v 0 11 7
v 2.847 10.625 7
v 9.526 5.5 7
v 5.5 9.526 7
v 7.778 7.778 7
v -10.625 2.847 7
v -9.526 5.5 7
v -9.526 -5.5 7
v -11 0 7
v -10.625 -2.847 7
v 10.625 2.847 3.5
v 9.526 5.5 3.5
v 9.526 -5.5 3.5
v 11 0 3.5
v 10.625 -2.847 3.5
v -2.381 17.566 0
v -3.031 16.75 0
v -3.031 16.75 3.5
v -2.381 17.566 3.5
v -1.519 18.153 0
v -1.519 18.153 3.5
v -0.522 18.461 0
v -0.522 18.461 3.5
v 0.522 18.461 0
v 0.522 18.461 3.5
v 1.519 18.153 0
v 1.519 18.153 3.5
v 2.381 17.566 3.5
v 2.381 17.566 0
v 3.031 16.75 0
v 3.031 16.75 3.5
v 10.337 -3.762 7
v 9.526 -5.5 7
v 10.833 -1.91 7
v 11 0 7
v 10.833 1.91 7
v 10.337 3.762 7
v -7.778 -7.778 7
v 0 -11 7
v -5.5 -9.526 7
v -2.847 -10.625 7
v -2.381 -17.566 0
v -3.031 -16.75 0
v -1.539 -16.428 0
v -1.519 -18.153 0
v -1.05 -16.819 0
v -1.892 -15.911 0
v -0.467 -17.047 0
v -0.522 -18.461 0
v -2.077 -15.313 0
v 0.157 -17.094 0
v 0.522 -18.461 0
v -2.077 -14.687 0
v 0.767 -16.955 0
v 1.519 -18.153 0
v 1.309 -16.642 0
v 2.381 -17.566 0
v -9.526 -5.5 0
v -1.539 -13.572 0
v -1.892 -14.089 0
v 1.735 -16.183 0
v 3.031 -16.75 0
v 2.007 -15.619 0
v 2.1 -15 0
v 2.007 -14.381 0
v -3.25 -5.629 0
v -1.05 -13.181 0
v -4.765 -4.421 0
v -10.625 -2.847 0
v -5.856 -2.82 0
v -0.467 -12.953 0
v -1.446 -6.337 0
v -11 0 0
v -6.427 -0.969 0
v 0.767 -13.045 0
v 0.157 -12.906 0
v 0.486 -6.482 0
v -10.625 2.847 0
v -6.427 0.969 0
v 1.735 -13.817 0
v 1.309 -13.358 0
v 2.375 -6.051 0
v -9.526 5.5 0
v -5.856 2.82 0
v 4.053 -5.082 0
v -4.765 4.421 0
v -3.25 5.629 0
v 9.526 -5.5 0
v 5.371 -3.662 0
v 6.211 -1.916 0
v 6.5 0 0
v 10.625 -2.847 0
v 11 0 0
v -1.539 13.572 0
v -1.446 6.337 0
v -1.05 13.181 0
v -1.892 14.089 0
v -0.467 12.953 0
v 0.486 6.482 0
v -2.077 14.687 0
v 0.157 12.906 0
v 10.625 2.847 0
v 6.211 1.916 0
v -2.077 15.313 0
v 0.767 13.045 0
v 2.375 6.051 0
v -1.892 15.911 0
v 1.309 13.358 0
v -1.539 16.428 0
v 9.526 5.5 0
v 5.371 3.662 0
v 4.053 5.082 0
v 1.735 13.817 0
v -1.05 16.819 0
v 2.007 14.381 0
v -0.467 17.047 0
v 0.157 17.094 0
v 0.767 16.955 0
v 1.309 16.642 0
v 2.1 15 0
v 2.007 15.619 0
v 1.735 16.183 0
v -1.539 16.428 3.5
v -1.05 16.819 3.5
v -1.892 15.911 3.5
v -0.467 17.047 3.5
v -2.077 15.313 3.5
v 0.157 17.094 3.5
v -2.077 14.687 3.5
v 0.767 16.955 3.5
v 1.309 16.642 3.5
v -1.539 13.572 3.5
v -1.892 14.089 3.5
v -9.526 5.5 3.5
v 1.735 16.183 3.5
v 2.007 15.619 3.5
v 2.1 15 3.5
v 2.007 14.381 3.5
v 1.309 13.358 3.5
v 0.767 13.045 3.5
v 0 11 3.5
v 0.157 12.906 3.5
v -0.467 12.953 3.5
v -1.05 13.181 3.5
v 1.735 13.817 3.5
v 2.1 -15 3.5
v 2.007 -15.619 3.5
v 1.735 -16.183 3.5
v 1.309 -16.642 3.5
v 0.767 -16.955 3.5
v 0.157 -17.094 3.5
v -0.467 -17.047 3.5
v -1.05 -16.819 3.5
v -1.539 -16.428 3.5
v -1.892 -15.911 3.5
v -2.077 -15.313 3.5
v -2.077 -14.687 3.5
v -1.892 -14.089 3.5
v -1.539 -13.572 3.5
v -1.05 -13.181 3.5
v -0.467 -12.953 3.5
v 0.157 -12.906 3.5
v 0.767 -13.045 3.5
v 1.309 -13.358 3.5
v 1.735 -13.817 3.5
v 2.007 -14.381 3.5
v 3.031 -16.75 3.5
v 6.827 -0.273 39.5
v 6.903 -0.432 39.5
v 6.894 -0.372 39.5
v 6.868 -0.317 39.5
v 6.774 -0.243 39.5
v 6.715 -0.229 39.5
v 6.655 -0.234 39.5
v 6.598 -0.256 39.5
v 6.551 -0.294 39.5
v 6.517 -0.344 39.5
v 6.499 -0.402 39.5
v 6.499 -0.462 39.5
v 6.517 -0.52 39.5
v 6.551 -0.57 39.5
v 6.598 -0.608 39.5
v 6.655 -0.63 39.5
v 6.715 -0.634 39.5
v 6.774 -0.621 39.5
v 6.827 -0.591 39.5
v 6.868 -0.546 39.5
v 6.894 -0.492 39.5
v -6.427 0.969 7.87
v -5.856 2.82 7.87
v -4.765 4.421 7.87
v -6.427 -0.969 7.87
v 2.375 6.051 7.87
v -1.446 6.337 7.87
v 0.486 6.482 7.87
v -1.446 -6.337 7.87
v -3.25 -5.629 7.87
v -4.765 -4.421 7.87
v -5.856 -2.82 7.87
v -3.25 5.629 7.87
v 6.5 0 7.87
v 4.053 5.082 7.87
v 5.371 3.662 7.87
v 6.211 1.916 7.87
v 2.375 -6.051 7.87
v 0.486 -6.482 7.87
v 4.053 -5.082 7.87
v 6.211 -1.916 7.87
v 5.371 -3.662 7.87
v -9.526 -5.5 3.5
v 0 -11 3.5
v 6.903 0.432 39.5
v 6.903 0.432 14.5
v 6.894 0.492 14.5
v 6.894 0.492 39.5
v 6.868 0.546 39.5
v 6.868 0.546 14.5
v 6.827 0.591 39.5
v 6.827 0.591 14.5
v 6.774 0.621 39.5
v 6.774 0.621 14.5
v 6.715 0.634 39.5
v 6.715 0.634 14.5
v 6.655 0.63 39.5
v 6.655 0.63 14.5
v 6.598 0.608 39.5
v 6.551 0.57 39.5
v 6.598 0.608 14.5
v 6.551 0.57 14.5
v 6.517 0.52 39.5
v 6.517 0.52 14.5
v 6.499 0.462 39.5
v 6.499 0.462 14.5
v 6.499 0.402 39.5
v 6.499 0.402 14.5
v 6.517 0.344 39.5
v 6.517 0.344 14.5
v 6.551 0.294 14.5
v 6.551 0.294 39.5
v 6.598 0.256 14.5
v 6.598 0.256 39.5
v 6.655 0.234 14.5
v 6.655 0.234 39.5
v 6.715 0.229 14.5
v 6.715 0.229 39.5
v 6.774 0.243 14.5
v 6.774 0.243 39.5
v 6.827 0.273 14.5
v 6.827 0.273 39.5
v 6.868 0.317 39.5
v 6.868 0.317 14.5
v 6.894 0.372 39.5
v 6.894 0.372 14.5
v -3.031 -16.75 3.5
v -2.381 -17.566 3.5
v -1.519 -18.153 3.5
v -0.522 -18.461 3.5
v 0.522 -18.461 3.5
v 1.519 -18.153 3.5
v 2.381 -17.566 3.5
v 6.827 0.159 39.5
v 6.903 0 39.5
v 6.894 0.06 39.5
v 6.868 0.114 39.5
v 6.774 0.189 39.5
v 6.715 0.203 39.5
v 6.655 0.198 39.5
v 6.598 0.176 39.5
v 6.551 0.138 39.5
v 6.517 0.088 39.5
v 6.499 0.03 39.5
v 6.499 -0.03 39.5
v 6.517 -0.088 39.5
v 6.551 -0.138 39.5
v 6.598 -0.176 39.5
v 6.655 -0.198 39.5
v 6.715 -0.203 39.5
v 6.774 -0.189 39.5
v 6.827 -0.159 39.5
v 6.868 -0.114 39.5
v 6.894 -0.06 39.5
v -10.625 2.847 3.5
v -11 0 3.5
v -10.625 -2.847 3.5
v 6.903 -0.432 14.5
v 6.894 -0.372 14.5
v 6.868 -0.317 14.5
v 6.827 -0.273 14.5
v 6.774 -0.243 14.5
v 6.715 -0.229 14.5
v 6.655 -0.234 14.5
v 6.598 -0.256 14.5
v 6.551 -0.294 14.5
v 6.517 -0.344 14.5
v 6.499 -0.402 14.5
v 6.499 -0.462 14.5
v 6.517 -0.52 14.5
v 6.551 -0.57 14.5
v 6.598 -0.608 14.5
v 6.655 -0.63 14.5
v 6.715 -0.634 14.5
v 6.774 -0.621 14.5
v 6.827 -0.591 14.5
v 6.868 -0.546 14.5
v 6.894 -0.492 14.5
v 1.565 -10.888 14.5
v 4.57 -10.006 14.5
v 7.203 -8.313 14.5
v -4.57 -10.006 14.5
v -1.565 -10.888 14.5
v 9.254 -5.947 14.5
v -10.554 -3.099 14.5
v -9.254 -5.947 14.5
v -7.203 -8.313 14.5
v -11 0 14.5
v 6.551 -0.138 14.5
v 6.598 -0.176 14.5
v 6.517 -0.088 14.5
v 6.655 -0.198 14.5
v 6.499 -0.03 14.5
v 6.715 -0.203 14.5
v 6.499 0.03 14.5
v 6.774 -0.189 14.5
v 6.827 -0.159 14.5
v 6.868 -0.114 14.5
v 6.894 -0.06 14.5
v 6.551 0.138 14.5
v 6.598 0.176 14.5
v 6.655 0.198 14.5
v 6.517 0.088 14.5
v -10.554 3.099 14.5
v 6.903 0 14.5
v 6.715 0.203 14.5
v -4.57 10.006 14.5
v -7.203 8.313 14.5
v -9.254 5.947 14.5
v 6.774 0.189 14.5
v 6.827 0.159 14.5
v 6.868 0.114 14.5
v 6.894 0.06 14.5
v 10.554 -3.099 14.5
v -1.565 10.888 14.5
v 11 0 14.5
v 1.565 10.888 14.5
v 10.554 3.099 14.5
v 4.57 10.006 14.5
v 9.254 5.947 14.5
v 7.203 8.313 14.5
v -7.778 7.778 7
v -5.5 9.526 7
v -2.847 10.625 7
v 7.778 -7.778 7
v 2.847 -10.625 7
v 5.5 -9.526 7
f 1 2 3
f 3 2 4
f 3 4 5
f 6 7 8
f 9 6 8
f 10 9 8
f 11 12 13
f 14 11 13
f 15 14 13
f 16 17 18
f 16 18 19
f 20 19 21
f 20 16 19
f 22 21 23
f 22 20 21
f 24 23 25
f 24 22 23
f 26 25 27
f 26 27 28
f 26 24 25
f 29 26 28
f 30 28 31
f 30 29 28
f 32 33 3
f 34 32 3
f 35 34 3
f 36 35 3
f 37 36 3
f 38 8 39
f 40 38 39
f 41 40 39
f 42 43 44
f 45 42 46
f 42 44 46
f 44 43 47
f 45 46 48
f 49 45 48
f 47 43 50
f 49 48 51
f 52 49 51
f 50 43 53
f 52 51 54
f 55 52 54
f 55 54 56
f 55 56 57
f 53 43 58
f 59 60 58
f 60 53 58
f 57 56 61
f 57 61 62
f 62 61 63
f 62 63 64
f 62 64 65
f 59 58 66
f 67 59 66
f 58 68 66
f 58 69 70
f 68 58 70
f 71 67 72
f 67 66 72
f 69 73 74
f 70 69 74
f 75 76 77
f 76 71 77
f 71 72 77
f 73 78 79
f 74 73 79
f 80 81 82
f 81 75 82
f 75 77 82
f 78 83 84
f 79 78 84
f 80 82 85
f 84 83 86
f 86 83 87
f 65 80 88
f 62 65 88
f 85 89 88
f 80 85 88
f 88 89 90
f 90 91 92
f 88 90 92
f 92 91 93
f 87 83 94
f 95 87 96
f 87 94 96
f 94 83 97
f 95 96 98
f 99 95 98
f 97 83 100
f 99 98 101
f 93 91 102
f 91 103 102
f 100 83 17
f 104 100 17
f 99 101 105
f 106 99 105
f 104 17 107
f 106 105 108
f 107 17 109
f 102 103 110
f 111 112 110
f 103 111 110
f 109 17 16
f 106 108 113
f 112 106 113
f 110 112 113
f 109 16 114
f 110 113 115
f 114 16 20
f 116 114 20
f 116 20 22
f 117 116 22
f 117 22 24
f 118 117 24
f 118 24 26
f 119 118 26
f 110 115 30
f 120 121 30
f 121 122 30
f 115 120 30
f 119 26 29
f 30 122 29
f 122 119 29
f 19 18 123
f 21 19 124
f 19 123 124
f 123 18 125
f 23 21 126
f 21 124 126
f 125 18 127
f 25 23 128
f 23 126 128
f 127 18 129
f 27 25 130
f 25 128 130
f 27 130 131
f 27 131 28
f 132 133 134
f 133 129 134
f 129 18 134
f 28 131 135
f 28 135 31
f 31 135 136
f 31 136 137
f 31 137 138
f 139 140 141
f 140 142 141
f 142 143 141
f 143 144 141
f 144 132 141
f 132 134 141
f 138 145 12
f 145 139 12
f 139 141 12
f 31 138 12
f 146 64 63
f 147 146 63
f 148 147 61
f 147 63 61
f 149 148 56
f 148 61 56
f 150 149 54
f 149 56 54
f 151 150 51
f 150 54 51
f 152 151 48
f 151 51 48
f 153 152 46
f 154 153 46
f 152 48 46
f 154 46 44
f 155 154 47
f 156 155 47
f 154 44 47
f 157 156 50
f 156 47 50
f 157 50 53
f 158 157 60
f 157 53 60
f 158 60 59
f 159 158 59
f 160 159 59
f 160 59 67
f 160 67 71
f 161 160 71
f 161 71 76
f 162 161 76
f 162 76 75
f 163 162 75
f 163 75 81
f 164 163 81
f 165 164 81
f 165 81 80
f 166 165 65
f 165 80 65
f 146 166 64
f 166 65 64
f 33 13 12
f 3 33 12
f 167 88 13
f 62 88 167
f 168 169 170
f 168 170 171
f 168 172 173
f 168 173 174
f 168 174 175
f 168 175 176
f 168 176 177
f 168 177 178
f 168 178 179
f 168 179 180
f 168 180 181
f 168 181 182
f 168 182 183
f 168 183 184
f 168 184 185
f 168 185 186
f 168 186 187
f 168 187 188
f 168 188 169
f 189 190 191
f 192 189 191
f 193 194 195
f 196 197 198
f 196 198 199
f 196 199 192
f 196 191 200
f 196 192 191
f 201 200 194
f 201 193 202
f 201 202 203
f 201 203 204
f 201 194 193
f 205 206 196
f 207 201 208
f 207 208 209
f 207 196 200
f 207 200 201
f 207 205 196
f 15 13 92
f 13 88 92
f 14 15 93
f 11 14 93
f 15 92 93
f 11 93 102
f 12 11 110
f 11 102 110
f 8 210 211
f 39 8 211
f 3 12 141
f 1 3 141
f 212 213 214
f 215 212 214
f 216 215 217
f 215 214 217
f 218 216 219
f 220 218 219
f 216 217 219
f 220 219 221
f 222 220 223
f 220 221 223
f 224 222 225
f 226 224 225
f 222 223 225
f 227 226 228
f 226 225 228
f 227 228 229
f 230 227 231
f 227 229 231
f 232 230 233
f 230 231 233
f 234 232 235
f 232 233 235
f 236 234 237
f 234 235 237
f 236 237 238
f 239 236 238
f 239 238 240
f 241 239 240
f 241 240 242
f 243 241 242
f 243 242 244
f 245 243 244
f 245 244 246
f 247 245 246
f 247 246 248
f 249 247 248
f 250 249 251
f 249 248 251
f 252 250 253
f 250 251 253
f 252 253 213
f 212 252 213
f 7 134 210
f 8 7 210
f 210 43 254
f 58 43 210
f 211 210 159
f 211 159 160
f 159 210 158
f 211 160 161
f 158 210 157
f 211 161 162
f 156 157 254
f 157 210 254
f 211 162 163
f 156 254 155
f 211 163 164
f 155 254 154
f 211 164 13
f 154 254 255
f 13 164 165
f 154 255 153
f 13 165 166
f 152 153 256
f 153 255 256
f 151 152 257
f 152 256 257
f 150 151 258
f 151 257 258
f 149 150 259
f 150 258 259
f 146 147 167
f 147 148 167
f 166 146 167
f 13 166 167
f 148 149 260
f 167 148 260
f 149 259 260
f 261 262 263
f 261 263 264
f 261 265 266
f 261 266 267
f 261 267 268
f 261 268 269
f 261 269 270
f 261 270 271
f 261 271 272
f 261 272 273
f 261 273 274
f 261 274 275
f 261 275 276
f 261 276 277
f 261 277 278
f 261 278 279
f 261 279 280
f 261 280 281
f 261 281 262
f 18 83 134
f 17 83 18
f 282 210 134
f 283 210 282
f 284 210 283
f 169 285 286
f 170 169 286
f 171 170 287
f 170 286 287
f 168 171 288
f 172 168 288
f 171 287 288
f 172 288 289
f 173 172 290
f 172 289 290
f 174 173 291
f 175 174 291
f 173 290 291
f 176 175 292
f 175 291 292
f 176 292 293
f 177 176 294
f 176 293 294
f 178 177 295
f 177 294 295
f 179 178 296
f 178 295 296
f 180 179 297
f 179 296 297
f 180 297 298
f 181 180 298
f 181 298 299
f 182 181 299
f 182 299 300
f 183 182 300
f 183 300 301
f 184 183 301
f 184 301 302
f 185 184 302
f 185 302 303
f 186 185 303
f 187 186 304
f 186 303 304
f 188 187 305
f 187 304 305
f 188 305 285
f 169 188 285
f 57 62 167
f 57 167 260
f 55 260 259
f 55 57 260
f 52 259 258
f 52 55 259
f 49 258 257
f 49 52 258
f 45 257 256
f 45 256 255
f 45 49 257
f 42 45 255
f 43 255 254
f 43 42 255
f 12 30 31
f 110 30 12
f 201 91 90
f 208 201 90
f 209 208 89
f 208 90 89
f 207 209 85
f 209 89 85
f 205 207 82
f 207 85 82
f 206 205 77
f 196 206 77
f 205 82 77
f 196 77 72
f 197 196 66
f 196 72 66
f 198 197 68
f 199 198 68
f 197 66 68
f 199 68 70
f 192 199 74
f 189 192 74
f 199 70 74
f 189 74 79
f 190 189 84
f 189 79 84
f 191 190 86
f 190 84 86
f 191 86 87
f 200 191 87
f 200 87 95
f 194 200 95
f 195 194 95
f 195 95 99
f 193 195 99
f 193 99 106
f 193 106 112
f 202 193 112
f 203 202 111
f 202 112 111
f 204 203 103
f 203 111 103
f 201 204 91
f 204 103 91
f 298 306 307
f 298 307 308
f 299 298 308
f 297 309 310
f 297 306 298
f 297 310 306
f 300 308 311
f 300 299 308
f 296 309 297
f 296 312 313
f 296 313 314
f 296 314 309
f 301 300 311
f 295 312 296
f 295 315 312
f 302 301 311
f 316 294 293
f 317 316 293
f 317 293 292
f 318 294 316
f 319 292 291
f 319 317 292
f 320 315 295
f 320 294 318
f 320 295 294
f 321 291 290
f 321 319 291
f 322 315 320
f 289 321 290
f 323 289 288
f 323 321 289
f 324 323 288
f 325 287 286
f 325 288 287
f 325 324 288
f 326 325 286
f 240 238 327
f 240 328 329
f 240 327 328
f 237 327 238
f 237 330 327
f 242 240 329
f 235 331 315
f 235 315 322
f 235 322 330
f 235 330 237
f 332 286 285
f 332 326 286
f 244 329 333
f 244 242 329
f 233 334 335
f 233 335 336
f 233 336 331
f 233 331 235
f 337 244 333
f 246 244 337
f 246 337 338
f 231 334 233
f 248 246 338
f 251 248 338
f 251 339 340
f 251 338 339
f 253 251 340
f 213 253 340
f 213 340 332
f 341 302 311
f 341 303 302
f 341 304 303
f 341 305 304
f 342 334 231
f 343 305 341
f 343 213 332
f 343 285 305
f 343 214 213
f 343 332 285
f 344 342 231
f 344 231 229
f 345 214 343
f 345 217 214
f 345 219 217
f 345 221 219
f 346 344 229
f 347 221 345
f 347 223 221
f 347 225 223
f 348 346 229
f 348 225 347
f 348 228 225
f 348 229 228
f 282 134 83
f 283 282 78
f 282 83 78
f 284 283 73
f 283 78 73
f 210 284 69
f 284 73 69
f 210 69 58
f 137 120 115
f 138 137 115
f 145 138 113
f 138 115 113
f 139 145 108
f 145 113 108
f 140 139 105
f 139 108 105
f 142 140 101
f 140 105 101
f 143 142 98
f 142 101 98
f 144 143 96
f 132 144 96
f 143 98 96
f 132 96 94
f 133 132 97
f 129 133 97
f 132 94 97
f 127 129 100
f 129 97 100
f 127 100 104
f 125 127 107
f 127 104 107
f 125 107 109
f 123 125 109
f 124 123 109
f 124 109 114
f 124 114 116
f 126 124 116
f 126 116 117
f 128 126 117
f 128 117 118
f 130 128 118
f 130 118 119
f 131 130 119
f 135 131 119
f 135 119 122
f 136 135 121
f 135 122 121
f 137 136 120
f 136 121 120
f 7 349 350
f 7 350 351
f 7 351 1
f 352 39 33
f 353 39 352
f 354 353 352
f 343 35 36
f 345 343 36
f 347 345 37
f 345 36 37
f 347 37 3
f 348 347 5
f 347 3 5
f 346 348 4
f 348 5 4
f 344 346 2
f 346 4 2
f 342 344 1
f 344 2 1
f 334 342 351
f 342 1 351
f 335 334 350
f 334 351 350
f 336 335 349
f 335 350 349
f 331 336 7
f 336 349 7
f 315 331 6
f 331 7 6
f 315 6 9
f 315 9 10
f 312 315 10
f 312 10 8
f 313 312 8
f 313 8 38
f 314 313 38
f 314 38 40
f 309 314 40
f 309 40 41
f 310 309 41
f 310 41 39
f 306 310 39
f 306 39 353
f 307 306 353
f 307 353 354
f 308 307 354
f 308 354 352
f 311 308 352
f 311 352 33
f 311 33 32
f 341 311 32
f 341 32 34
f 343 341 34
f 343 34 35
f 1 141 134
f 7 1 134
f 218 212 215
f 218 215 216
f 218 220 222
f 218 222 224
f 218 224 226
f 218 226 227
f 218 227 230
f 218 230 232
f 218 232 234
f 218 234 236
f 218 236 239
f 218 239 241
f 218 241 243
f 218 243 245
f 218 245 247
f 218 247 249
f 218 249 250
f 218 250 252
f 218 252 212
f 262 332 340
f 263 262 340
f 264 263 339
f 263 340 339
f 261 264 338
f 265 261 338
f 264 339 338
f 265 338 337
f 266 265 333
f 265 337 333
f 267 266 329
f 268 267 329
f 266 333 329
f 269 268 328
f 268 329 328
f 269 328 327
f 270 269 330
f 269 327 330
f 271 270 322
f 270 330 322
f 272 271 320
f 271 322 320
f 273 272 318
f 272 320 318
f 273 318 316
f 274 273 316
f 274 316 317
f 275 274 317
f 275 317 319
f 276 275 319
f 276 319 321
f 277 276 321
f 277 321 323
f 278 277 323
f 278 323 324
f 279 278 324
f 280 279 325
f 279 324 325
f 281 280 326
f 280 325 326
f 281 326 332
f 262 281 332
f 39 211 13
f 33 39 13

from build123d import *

# Parameters (mm, degrees)
F0_R      = 11
F1_DEPTH  = 14.5
F2_R      = 2.1
F3_DEPTH  = 3.5
F4_R      = 11
F5_DEPTH  = 3.5
F7_DEPTH  = 3.5
F8_R      = 6.5
F9_DEPTH  = 7.87
F10_R     = 0.2032
F11_DEPTH = 25


# Not quite as in the source:
# - a pattern or mirror of a feature is missing from the dataset's text; its kind, count and spacing are read off the source's solid


with BuildPart() as f1:
    # F0 (on Top) → F1 (new body)
    with BuildSketch(Plane.XY):
        Circle(F0_R)
    extrude(amount=F1_DEPTH)

    # F2 (on face) → F3 (join)
    with BuildSketch(Plane(origin=(0, 0, 0), x_dir=(1, 0, 0), z_dir=(0, 0, -1))):
        with BuildLine():
            Line((9.5262794416, 5.5), (3.0310889132, 16.75))
            ThreePointArc((3.0310889132, 16.75), (0, 18.5), (-3.0310889132, 16.75))
            Line((-3.0310889132, 16.75), (-9.5262794416, 5.5))
            ThreePointArc((-9.5262794416, 5.5), (0, 11), (9.5262794416, 5.5))
        make_face()
        with Locations((0, 15)):
            Circle(F2_R, mode=Mode.SUBTRACT)
        with BuildLine():
            ThreePointArc((9.5262794416, -5.5), (0, -11), (-9.5262794416, -5.5))
            Line((-9.5262794416, -5.5), (-3.0310889132, -16.75))
            ThreePointArc((-3.0310889132, -16.75), (0, -18.5), (3.0310889132, -16.75))
            Line((3.0310889132, -16.75), (9.5262794416, -5.5))
        make_face()
        with Locations((0, -15)):
            Circle(F2_R, mode=Mode.SUBTRACT)
    f3 = extrude(amount=-F3_DEPTH)

    # F3_copies: F3 across plane
    add(f3.mirror(Plane(origin=(0, 0, 0), x_dir=(0, 0, -1), z_dir=(-1, 0, 0))))

    # F4 (on face) → F5 (cut)
    with BuildSketch(Plane.XY.offset(3.5)):
        Circle(F4_R)
    extrude(amount=F5_DEPTH, mode=Mode.SUBTRACT)

    # F6 (on face) → F7 (join)
    with BuildSketch(Plane.XY.offset(3.5)):
        Polygon((9.5262794416, 5.5), (0, 11), (-9.5262794416, 5.5), (-9.5262794416, -5.5), (0, -11), (9.5262794416, -5.5), align=None)
    extrude(amount=F7_DEPTH)

    # F8 (on face) → F9 (cut)
    with BuildSketch(Plane(origin=(0, 0, 0), x_dir=(1, 0, 0), z_dir=(0, 0, -1))):
        Circle(F8_R)
    extrude(amount=-F9_DEPTH, mode=Mode.SUBTRACT)

    # F10 (on face) → F11 (join)
    with BuildSketch(Plane.XY.offset(14.5)):
        with Locations((6.7, 0)):
            Circle(F10_R)
        with Locations((6.7, 0.4318)):
            Circle(F10_R)
        with Locations((6.7, -0.4318)):
            Circle(F10_R)
    extrude(amount=F11_DEPTH)


solid = f1.part
